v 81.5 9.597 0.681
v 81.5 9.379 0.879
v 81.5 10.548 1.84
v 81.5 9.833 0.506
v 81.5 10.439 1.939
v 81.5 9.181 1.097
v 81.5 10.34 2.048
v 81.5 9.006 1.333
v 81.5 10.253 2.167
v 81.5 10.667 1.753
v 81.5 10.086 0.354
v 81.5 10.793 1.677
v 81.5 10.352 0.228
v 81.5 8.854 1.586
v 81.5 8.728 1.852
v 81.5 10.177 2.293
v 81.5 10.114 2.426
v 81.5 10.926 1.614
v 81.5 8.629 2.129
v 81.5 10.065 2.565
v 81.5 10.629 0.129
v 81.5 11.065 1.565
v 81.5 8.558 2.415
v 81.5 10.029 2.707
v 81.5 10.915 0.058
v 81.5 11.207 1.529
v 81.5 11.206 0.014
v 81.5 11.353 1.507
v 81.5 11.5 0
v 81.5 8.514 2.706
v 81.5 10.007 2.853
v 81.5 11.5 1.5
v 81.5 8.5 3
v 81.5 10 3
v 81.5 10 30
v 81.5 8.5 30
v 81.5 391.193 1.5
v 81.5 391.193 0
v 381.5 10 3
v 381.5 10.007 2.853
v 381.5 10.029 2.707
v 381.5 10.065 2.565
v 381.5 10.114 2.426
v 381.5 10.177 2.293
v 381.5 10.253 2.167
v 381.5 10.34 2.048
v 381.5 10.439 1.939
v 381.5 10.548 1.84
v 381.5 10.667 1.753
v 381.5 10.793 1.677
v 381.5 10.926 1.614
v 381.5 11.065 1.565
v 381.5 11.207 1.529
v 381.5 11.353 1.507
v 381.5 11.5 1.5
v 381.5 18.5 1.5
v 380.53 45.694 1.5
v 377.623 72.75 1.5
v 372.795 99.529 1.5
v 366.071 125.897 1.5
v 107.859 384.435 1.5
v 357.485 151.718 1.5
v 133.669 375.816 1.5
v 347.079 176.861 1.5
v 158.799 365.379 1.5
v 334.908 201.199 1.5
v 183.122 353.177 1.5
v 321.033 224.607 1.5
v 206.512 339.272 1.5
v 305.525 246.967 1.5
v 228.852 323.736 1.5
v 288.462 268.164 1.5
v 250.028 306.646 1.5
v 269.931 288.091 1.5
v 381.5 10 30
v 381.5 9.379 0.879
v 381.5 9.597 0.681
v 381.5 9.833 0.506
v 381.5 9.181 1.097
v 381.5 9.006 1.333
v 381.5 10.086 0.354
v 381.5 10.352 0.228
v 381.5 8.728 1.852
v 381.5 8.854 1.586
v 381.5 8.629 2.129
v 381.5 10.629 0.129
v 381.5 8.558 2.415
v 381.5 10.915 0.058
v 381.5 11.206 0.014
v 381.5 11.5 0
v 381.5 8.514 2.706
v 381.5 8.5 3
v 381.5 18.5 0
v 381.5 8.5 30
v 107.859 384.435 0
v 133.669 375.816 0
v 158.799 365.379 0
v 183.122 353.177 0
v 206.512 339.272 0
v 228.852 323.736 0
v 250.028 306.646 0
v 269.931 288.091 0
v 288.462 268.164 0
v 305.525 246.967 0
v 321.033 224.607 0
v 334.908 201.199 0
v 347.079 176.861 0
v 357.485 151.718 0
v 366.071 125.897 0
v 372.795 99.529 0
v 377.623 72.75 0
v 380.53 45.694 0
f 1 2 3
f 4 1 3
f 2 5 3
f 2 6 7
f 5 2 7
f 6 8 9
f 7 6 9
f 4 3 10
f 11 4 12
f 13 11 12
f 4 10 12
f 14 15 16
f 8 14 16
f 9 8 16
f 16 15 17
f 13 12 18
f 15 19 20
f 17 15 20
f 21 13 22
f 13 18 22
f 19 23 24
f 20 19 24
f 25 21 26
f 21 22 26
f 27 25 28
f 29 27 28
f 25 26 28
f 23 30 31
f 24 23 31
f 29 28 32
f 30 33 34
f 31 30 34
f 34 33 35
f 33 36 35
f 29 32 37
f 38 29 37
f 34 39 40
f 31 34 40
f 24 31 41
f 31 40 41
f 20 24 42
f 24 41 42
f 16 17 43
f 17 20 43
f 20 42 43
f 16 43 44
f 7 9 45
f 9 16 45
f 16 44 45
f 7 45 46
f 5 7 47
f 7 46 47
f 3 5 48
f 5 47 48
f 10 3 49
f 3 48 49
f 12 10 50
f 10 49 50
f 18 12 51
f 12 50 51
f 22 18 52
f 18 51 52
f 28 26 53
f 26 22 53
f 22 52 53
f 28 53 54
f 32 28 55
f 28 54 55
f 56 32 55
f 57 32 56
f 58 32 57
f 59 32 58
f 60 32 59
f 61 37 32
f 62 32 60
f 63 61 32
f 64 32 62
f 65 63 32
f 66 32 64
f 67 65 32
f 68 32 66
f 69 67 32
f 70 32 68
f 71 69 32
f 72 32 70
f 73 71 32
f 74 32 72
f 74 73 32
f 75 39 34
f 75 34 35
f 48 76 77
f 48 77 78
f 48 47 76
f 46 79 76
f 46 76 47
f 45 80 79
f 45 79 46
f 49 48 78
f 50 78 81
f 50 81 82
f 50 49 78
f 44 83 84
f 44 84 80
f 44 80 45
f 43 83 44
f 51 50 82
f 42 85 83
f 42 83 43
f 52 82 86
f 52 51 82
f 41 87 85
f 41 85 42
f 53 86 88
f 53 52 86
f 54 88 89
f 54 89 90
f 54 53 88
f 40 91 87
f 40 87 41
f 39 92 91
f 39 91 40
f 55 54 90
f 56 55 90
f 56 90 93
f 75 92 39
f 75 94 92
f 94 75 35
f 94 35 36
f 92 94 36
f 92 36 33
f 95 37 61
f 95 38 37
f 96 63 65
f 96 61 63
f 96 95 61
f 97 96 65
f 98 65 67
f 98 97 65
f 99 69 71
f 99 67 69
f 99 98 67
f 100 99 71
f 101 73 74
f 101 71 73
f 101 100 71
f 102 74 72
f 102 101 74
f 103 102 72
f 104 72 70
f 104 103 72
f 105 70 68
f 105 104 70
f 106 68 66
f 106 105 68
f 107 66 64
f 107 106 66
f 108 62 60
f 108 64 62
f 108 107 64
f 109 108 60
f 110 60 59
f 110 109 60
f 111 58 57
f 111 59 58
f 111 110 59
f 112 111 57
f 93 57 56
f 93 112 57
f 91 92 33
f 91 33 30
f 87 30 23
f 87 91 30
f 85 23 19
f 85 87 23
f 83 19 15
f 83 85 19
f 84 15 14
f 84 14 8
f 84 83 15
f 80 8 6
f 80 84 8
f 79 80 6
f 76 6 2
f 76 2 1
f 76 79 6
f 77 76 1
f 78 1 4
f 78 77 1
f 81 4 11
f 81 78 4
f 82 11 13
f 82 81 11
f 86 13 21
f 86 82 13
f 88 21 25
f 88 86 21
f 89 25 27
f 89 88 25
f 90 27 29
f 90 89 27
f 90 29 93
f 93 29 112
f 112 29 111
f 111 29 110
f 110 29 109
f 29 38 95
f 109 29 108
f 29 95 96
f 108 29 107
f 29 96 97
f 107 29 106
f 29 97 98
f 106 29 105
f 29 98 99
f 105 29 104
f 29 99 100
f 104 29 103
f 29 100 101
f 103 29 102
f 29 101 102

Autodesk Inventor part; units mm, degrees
ref_plane "YZ Plane" through (0, 0, 0) normal (1, 0, 0) x (0, 1, 0)
ref_plane "XZ Plane" through (0, 0, 0) normal (0, 1, 0) x (-1, 0, 0)
ref_plane "XY Plane" through (0, 0, 0) normal (0, 0, 1) x (1, 0, 0)
ref_plane "Work Plane1" through (0, 0, 0) normal (0, 0, 1) x (1, 0, 0)
sketch "Sketch1" plane through (0, 0, 0) normal (0, 0, 1) x (1, 0, 0)
  arc A0 (381.5, 18.5) -> (0, 400) centre (0, 18.5) ccw
  line L0 (381.5, 18.5) -> (81.5, 18.5)
  line L1 (81.5, 18.5) -> (81.5, 391.1929)
  line L2 (81.5, 18.5) -> (381.5, 18.5)
  line L3 (381.5, 18.5) -> (381.5, -1.5)
  line L4 (381.5, -1.5) -> (81.5, -1.5)
  line L5 (81.5, -1.5) -> (81.5, 18.5)
  point P0 (0, 0)
  dimension "d0" = 300
  dimension "d2" = 20
extrude "Plate1" add sketch "Sketch1" along normal blind 1.5
sketch "Sketch2" plane through (0, 0, 1.5) normal (0, 0, 1) x (1, 0, 0)
  arc A0 (381.5, 18.5) -> (81.5, 391.1929) centre (0, 18.5) ccw projected
  line L0 (81.5, -1.5) -> (81.5, 391.1929) projected
  line L1 (381.5, -1.5) -> (81.5, -1.5) projected
  line L2 (381.5, 18.5) -> (381.5, -1.5) projected
  line L3 (81.5, 8.5) -> (381.5, 8.5)
  point P0 (0, 0)
  dimension "d3" = 10
extrude "Extrusion1" cut sketch "Sketch2" against normal through all contours L2 L1 L0 L3
sketch "Sketch3" plane through (381.5, 10, 0) normal (0, -1, 0) x (1, 0, 0)
  line L0 (-300, 0) -> (0, 0)
  line L1 (0, 0) -> (0, 30)
  line L2 (0, 30) -> (-300, 30)
  line L3 (-300, 30) -> (-300, 0)
edge flange "Flange1" height 30 angle 90 thickness 1.5 bend radius 1.5 thickness toward (0, -1, 0) relief tear relief width 1.5 relief depth 0.75 edges at (231.5, 8.5, 1.5) wall of the first edge with corners at (81.5, 10, 0) (381.5, 10, 0) (381.5, 10, 30) (81.5, 10, 30)
bend "Bend1"
corner "Corner1"
equation "\"d1\" = Thickness"
equation "\"d6\" = BendReliefWidth"
equation "\"d7\" = BendReliefDepth"
equation "\"d8\" = MinimumRemnant"
equation "\"d9\" = TransitionRadius"
equation "\"d12\" = BendRadius"
equation "\"d13\" = CornerReliefSize"
equation "\"d14\" = GapSize"
equation "\"d15\" = JacobiRadiusSize"
equation "\"BendRadius\" = Thickness"
equation "\"BendReliefWidth\" = Thickness"
equation "\"BendReliefDepth\" = 0.5 * Thickness"
equation "\"CornerReliefSize\" = 4 * Thickness"
equation "\"MinimumRemnant\" = 2 * Thickness"
equation "\"TransitionRadius\" = BendRadius"
equation "\"JacobiRadiusSize\" = BendRadius"
equation "\"GapSize\" = Thickness"
equation "\"Thickness\" = 1.5"
properties part number "CHAPA_7"
